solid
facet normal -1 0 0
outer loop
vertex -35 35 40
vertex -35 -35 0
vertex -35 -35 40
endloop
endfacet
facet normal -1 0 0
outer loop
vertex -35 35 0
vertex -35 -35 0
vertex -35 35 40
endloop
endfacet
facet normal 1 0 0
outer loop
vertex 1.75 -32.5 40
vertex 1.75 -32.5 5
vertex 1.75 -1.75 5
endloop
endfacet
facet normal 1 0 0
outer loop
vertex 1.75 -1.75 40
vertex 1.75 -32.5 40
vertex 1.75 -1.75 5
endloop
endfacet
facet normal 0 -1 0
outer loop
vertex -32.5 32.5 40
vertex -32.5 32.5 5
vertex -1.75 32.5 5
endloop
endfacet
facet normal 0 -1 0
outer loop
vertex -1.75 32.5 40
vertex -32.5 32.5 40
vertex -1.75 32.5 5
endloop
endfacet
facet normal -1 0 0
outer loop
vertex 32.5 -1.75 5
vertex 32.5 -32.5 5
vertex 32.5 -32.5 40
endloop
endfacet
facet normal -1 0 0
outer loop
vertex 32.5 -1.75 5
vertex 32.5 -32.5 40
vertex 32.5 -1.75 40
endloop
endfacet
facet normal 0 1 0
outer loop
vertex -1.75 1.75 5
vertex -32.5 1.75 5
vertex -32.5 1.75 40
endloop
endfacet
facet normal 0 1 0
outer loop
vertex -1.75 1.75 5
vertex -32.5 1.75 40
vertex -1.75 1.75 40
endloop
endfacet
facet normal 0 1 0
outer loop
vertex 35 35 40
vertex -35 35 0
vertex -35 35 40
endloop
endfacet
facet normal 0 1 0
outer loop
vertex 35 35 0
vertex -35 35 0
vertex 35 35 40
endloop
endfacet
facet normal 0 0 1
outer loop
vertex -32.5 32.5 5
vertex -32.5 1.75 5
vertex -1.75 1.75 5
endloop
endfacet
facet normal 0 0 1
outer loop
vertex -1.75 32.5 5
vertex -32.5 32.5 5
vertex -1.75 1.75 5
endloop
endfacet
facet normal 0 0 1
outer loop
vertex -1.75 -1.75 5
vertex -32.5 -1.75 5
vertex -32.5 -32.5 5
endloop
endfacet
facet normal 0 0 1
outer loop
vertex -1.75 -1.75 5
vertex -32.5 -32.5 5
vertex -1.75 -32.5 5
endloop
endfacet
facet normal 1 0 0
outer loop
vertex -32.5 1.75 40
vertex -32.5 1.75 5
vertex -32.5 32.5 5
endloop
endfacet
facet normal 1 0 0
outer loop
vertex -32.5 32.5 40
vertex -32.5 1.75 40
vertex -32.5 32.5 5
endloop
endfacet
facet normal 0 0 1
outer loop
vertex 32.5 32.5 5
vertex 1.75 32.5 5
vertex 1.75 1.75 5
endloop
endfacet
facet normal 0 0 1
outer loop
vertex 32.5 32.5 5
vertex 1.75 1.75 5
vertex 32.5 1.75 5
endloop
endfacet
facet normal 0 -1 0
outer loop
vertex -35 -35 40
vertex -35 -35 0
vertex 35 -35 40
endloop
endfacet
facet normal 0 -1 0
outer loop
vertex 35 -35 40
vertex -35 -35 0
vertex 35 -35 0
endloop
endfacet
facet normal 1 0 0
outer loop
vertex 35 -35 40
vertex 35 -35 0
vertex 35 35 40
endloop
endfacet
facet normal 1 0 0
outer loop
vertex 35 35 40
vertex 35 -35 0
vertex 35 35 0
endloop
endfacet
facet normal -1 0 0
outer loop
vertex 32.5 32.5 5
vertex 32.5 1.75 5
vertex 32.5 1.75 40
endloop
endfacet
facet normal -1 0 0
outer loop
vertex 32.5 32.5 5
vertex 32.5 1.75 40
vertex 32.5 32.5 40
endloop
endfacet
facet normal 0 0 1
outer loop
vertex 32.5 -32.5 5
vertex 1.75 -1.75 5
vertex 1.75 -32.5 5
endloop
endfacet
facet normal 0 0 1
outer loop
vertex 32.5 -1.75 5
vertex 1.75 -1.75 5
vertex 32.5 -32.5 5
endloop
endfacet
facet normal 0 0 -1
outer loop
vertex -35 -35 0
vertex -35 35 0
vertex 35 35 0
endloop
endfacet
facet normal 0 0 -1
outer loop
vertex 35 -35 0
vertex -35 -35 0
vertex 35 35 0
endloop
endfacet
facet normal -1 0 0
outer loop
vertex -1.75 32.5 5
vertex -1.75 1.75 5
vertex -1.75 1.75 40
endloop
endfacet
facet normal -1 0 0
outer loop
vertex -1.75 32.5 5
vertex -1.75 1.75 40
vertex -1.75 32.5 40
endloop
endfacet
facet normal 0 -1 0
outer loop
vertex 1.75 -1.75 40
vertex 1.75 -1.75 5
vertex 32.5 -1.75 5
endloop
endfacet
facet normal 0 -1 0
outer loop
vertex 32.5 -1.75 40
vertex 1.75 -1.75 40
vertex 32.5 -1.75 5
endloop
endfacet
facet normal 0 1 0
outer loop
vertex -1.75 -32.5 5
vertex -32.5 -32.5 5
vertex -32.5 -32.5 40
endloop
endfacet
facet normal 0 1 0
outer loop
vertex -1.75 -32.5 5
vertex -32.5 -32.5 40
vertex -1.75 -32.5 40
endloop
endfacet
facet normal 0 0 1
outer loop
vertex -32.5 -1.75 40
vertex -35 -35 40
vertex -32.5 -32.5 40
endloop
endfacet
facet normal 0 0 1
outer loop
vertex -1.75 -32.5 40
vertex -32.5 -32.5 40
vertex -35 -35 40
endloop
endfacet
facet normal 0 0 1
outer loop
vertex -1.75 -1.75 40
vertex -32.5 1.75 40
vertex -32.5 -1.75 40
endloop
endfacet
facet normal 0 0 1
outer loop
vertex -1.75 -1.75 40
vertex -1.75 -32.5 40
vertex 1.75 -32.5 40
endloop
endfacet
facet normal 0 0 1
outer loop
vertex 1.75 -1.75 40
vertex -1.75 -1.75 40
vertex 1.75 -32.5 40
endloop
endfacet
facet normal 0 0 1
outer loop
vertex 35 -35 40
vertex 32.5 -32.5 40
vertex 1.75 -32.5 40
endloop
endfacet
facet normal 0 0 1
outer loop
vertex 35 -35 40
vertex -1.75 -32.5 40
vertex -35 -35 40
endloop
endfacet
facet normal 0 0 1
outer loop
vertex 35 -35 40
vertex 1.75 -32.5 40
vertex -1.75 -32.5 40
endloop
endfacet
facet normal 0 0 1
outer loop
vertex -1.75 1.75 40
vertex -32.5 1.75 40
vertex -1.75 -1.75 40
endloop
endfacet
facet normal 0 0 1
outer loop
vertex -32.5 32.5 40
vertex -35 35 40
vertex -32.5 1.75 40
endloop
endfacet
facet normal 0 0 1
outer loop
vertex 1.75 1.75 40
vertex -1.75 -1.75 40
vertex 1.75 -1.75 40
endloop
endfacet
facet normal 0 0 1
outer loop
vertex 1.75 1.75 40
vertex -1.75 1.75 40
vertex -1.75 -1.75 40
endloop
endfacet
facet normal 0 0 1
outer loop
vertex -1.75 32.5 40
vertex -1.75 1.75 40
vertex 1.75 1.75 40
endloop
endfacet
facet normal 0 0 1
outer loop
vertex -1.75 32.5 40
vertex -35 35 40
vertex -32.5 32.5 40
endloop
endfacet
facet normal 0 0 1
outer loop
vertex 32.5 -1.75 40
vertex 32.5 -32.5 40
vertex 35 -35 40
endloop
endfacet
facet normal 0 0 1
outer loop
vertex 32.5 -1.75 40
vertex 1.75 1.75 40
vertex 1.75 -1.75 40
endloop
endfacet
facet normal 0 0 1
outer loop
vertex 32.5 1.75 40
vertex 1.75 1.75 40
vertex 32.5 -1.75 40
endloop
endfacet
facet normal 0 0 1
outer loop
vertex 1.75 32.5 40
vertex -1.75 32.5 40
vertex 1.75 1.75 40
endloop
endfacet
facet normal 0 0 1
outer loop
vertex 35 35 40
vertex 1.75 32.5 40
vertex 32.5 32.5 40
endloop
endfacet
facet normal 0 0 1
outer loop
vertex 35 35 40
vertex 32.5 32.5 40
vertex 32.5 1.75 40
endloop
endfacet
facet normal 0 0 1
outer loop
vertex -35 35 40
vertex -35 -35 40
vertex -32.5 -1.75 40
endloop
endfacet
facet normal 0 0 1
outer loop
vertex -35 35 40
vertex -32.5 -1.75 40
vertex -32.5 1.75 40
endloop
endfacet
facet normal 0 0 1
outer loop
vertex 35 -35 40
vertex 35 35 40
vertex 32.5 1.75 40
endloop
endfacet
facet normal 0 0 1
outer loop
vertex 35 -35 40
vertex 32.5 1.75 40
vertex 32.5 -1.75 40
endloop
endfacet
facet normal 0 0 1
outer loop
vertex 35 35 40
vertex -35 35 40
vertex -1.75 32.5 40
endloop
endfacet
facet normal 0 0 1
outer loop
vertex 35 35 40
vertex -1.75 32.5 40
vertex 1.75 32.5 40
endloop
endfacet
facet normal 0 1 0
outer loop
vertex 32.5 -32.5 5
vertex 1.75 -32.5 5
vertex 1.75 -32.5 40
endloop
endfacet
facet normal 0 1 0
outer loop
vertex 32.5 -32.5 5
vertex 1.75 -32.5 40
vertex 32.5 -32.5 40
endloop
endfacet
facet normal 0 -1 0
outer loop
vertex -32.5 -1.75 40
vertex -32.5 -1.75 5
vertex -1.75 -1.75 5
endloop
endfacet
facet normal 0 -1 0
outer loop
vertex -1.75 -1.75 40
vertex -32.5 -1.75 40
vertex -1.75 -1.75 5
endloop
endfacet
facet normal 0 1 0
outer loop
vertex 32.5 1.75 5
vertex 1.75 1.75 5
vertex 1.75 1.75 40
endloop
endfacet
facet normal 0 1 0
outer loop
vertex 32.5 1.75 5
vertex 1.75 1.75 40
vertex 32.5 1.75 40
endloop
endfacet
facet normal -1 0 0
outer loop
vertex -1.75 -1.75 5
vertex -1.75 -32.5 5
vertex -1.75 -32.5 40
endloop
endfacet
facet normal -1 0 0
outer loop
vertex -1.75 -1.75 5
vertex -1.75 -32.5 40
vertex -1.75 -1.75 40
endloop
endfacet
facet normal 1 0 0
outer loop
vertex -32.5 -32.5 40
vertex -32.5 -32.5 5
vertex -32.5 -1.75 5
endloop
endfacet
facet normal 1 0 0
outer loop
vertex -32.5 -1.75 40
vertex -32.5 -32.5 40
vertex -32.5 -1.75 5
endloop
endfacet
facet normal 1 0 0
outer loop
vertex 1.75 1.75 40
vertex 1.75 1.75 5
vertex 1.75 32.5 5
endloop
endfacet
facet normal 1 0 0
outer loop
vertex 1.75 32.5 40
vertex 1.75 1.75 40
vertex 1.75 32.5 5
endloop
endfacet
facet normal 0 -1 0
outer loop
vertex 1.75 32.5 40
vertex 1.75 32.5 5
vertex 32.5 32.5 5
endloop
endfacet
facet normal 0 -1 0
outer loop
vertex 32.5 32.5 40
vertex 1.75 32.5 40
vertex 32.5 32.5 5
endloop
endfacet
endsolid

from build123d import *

# Parameters (mm, degrees)
F0_W     = 70
F0_H     = 70
F0_W_2   = 30.75
F0_H_2   = 30.75
F1_DEPTH = 40
F2_DEPTH = 5


with BuildPart() as f1:
    # F0 (on Top) → F1 (new body)
    with BuildSketch(Plane.XY):
        Rectangle(F0_W, F0_H)
        with Locations((-17.125, -17.125)):
            Rectangle(F0_W_2, F0_H_2, mode=Mode.SUBTRACT)
        with Locations((17.125, -17.125)):
            Rectangle(F0_W_2, F0_H_2, mode=Mode.SUBTRACT)
        with Locations((-17.125, 17.125)):
            Rectangle(F0_W_2, F0_H_2, mode=Mode.SUBTRACT)
        with Locations((17.125, 17.125)):
            Rectangle(F0_W_2, F0_H_2, mode=Mode.SUBTRACT)
    extrude(amount=F1_DEPTH)

    # F0 (on Top) → F2 (join)
    with BuildSketch(Plane.XY):
        with Locations((17.125, 17.125)):
            Rectangle(F0_W_2, F0_H_2)
        with Locations((17.125, -17.125)):
            Rectangle(F0_W_2, F0_H_2)
        with Locations((-17.125, -17.125)):
            Rectangle(F0_W_2, F0_H_2)
        with Locations((-17.125, 17.125)):
            Rectangle(F0_W_2, F0_H_2)
    extrude(amount=F2_DEPTH)


solid = f1.part
